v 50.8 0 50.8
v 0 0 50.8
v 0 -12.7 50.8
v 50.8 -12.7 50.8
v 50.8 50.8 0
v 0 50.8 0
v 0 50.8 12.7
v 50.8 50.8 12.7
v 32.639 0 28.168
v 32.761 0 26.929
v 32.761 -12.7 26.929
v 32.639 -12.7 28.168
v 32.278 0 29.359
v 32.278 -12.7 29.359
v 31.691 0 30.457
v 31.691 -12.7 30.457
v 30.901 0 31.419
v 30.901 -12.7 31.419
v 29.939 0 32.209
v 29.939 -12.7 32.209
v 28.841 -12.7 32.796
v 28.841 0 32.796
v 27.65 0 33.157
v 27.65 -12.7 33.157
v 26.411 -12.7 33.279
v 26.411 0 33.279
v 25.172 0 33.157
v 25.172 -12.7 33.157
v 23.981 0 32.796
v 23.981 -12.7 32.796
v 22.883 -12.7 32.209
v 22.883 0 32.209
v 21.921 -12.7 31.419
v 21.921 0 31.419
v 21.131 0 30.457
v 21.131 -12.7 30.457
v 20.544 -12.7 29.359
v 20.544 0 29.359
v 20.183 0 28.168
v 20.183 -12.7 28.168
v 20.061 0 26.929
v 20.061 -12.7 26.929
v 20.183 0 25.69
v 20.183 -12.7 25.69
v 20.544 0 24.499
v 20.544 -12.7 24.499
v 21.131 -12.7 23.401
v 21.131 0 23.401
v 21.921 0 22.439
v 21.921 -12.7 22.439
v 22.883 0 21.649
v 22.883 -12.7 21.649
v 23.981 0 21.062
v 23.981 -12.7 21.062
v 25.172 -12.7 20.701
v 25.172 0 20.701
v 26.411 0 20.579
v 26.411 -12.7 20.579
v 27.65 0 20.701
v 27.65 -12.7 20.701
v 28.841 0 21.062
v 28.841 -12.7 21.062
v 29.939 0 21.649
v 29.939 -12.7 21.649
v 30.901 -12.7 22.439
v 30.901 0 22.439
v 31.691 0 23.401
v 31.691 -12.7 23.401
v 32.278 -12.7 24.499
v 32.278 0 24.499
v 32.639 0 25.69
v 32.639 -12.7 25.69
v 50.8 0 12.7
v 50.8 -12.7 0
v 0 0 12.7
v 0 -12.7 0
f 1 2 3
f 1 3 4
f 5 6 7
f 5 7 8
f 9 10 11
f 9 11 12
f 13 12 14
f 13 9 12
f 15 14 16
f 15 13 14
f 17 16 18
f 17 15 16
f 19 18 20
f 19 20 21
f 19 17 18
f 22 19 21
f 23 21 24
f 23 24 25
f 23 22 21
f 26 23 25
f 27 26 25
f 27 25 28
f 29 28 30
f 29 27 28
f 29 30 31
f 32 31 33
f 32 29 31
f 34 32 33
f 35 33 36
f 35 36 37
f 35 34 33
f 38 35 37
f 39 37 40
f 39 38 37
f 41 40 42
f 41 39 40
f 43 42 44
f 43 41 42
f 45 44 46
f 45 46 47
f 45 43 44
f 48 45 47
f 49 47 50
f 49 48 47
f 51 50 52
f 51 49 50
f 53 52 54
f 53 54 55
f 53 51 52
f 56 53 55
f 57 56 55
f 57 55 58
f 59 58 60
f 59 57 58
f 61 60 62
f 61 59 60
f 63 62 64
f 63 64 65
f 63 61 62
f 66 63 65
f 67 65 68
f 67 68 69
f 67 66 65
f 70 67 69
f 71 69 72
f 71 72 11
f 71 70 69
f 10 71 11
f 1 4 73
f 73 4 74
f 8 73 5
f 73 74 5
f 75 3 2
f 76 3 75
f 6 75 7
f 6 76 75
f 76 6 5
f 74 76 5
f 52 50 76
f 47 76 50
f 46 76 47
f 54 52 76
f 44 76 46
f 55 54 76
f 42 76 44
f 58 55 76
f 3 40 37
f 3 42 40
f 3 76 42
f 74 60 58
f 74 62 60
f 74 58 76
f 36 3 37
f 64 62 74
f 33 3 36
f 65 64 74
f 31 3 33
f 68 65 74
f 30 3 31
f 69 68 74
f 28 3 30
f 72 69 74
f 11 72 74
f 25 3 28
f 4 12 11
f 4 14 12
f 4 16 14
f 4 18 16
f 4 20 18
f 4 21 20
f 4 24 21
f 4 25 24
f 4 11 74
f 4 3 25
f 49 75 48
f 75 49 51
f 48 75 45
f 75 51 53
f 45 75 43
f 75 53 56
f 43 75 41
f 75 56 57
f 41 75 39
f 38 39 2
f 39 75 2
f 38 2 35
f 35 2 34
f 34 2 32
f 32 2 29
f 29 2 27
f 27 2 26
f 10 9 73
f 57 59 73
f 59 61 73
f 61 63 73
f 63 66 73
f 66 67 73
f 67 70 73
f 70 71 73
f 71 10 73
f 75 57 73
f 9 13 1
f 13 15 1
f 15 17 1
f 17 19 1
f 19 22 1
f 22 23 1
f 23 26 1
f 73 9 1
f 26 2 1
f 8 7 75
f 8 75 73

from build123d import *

# Parameters (mm, degrees)
F0_W     = 50.8
F0_H     = 50.8
F0_R     = 6.35
F2_DEPTH = 12.7
F1_W     = 50.8
F1_H     = 50.8
F3_DEPTH = 12.7


with BuildPart() as f2:
    # F0 (on Front) → F2 (new body)
    with BuildSketch(Plane.XZ):
        with Locations((25.4, 25.4)):
            Rectangle(F0_W, F0_H)
        with Locations((26.411066, 26.928931)):
            Circle(F0_R, mode=Mode.SUBTRACT)
    extrude(amount=F2_DEPTH)

    # F1 (on Top) → F3 (join)
    with BuildSketch(Plane.XY):
        with Locations((25.4, 25.4)):
            Rectangle(F1_W, F1_H)
    extrude(amount=F3_DEPTH)


solid = f2.part
